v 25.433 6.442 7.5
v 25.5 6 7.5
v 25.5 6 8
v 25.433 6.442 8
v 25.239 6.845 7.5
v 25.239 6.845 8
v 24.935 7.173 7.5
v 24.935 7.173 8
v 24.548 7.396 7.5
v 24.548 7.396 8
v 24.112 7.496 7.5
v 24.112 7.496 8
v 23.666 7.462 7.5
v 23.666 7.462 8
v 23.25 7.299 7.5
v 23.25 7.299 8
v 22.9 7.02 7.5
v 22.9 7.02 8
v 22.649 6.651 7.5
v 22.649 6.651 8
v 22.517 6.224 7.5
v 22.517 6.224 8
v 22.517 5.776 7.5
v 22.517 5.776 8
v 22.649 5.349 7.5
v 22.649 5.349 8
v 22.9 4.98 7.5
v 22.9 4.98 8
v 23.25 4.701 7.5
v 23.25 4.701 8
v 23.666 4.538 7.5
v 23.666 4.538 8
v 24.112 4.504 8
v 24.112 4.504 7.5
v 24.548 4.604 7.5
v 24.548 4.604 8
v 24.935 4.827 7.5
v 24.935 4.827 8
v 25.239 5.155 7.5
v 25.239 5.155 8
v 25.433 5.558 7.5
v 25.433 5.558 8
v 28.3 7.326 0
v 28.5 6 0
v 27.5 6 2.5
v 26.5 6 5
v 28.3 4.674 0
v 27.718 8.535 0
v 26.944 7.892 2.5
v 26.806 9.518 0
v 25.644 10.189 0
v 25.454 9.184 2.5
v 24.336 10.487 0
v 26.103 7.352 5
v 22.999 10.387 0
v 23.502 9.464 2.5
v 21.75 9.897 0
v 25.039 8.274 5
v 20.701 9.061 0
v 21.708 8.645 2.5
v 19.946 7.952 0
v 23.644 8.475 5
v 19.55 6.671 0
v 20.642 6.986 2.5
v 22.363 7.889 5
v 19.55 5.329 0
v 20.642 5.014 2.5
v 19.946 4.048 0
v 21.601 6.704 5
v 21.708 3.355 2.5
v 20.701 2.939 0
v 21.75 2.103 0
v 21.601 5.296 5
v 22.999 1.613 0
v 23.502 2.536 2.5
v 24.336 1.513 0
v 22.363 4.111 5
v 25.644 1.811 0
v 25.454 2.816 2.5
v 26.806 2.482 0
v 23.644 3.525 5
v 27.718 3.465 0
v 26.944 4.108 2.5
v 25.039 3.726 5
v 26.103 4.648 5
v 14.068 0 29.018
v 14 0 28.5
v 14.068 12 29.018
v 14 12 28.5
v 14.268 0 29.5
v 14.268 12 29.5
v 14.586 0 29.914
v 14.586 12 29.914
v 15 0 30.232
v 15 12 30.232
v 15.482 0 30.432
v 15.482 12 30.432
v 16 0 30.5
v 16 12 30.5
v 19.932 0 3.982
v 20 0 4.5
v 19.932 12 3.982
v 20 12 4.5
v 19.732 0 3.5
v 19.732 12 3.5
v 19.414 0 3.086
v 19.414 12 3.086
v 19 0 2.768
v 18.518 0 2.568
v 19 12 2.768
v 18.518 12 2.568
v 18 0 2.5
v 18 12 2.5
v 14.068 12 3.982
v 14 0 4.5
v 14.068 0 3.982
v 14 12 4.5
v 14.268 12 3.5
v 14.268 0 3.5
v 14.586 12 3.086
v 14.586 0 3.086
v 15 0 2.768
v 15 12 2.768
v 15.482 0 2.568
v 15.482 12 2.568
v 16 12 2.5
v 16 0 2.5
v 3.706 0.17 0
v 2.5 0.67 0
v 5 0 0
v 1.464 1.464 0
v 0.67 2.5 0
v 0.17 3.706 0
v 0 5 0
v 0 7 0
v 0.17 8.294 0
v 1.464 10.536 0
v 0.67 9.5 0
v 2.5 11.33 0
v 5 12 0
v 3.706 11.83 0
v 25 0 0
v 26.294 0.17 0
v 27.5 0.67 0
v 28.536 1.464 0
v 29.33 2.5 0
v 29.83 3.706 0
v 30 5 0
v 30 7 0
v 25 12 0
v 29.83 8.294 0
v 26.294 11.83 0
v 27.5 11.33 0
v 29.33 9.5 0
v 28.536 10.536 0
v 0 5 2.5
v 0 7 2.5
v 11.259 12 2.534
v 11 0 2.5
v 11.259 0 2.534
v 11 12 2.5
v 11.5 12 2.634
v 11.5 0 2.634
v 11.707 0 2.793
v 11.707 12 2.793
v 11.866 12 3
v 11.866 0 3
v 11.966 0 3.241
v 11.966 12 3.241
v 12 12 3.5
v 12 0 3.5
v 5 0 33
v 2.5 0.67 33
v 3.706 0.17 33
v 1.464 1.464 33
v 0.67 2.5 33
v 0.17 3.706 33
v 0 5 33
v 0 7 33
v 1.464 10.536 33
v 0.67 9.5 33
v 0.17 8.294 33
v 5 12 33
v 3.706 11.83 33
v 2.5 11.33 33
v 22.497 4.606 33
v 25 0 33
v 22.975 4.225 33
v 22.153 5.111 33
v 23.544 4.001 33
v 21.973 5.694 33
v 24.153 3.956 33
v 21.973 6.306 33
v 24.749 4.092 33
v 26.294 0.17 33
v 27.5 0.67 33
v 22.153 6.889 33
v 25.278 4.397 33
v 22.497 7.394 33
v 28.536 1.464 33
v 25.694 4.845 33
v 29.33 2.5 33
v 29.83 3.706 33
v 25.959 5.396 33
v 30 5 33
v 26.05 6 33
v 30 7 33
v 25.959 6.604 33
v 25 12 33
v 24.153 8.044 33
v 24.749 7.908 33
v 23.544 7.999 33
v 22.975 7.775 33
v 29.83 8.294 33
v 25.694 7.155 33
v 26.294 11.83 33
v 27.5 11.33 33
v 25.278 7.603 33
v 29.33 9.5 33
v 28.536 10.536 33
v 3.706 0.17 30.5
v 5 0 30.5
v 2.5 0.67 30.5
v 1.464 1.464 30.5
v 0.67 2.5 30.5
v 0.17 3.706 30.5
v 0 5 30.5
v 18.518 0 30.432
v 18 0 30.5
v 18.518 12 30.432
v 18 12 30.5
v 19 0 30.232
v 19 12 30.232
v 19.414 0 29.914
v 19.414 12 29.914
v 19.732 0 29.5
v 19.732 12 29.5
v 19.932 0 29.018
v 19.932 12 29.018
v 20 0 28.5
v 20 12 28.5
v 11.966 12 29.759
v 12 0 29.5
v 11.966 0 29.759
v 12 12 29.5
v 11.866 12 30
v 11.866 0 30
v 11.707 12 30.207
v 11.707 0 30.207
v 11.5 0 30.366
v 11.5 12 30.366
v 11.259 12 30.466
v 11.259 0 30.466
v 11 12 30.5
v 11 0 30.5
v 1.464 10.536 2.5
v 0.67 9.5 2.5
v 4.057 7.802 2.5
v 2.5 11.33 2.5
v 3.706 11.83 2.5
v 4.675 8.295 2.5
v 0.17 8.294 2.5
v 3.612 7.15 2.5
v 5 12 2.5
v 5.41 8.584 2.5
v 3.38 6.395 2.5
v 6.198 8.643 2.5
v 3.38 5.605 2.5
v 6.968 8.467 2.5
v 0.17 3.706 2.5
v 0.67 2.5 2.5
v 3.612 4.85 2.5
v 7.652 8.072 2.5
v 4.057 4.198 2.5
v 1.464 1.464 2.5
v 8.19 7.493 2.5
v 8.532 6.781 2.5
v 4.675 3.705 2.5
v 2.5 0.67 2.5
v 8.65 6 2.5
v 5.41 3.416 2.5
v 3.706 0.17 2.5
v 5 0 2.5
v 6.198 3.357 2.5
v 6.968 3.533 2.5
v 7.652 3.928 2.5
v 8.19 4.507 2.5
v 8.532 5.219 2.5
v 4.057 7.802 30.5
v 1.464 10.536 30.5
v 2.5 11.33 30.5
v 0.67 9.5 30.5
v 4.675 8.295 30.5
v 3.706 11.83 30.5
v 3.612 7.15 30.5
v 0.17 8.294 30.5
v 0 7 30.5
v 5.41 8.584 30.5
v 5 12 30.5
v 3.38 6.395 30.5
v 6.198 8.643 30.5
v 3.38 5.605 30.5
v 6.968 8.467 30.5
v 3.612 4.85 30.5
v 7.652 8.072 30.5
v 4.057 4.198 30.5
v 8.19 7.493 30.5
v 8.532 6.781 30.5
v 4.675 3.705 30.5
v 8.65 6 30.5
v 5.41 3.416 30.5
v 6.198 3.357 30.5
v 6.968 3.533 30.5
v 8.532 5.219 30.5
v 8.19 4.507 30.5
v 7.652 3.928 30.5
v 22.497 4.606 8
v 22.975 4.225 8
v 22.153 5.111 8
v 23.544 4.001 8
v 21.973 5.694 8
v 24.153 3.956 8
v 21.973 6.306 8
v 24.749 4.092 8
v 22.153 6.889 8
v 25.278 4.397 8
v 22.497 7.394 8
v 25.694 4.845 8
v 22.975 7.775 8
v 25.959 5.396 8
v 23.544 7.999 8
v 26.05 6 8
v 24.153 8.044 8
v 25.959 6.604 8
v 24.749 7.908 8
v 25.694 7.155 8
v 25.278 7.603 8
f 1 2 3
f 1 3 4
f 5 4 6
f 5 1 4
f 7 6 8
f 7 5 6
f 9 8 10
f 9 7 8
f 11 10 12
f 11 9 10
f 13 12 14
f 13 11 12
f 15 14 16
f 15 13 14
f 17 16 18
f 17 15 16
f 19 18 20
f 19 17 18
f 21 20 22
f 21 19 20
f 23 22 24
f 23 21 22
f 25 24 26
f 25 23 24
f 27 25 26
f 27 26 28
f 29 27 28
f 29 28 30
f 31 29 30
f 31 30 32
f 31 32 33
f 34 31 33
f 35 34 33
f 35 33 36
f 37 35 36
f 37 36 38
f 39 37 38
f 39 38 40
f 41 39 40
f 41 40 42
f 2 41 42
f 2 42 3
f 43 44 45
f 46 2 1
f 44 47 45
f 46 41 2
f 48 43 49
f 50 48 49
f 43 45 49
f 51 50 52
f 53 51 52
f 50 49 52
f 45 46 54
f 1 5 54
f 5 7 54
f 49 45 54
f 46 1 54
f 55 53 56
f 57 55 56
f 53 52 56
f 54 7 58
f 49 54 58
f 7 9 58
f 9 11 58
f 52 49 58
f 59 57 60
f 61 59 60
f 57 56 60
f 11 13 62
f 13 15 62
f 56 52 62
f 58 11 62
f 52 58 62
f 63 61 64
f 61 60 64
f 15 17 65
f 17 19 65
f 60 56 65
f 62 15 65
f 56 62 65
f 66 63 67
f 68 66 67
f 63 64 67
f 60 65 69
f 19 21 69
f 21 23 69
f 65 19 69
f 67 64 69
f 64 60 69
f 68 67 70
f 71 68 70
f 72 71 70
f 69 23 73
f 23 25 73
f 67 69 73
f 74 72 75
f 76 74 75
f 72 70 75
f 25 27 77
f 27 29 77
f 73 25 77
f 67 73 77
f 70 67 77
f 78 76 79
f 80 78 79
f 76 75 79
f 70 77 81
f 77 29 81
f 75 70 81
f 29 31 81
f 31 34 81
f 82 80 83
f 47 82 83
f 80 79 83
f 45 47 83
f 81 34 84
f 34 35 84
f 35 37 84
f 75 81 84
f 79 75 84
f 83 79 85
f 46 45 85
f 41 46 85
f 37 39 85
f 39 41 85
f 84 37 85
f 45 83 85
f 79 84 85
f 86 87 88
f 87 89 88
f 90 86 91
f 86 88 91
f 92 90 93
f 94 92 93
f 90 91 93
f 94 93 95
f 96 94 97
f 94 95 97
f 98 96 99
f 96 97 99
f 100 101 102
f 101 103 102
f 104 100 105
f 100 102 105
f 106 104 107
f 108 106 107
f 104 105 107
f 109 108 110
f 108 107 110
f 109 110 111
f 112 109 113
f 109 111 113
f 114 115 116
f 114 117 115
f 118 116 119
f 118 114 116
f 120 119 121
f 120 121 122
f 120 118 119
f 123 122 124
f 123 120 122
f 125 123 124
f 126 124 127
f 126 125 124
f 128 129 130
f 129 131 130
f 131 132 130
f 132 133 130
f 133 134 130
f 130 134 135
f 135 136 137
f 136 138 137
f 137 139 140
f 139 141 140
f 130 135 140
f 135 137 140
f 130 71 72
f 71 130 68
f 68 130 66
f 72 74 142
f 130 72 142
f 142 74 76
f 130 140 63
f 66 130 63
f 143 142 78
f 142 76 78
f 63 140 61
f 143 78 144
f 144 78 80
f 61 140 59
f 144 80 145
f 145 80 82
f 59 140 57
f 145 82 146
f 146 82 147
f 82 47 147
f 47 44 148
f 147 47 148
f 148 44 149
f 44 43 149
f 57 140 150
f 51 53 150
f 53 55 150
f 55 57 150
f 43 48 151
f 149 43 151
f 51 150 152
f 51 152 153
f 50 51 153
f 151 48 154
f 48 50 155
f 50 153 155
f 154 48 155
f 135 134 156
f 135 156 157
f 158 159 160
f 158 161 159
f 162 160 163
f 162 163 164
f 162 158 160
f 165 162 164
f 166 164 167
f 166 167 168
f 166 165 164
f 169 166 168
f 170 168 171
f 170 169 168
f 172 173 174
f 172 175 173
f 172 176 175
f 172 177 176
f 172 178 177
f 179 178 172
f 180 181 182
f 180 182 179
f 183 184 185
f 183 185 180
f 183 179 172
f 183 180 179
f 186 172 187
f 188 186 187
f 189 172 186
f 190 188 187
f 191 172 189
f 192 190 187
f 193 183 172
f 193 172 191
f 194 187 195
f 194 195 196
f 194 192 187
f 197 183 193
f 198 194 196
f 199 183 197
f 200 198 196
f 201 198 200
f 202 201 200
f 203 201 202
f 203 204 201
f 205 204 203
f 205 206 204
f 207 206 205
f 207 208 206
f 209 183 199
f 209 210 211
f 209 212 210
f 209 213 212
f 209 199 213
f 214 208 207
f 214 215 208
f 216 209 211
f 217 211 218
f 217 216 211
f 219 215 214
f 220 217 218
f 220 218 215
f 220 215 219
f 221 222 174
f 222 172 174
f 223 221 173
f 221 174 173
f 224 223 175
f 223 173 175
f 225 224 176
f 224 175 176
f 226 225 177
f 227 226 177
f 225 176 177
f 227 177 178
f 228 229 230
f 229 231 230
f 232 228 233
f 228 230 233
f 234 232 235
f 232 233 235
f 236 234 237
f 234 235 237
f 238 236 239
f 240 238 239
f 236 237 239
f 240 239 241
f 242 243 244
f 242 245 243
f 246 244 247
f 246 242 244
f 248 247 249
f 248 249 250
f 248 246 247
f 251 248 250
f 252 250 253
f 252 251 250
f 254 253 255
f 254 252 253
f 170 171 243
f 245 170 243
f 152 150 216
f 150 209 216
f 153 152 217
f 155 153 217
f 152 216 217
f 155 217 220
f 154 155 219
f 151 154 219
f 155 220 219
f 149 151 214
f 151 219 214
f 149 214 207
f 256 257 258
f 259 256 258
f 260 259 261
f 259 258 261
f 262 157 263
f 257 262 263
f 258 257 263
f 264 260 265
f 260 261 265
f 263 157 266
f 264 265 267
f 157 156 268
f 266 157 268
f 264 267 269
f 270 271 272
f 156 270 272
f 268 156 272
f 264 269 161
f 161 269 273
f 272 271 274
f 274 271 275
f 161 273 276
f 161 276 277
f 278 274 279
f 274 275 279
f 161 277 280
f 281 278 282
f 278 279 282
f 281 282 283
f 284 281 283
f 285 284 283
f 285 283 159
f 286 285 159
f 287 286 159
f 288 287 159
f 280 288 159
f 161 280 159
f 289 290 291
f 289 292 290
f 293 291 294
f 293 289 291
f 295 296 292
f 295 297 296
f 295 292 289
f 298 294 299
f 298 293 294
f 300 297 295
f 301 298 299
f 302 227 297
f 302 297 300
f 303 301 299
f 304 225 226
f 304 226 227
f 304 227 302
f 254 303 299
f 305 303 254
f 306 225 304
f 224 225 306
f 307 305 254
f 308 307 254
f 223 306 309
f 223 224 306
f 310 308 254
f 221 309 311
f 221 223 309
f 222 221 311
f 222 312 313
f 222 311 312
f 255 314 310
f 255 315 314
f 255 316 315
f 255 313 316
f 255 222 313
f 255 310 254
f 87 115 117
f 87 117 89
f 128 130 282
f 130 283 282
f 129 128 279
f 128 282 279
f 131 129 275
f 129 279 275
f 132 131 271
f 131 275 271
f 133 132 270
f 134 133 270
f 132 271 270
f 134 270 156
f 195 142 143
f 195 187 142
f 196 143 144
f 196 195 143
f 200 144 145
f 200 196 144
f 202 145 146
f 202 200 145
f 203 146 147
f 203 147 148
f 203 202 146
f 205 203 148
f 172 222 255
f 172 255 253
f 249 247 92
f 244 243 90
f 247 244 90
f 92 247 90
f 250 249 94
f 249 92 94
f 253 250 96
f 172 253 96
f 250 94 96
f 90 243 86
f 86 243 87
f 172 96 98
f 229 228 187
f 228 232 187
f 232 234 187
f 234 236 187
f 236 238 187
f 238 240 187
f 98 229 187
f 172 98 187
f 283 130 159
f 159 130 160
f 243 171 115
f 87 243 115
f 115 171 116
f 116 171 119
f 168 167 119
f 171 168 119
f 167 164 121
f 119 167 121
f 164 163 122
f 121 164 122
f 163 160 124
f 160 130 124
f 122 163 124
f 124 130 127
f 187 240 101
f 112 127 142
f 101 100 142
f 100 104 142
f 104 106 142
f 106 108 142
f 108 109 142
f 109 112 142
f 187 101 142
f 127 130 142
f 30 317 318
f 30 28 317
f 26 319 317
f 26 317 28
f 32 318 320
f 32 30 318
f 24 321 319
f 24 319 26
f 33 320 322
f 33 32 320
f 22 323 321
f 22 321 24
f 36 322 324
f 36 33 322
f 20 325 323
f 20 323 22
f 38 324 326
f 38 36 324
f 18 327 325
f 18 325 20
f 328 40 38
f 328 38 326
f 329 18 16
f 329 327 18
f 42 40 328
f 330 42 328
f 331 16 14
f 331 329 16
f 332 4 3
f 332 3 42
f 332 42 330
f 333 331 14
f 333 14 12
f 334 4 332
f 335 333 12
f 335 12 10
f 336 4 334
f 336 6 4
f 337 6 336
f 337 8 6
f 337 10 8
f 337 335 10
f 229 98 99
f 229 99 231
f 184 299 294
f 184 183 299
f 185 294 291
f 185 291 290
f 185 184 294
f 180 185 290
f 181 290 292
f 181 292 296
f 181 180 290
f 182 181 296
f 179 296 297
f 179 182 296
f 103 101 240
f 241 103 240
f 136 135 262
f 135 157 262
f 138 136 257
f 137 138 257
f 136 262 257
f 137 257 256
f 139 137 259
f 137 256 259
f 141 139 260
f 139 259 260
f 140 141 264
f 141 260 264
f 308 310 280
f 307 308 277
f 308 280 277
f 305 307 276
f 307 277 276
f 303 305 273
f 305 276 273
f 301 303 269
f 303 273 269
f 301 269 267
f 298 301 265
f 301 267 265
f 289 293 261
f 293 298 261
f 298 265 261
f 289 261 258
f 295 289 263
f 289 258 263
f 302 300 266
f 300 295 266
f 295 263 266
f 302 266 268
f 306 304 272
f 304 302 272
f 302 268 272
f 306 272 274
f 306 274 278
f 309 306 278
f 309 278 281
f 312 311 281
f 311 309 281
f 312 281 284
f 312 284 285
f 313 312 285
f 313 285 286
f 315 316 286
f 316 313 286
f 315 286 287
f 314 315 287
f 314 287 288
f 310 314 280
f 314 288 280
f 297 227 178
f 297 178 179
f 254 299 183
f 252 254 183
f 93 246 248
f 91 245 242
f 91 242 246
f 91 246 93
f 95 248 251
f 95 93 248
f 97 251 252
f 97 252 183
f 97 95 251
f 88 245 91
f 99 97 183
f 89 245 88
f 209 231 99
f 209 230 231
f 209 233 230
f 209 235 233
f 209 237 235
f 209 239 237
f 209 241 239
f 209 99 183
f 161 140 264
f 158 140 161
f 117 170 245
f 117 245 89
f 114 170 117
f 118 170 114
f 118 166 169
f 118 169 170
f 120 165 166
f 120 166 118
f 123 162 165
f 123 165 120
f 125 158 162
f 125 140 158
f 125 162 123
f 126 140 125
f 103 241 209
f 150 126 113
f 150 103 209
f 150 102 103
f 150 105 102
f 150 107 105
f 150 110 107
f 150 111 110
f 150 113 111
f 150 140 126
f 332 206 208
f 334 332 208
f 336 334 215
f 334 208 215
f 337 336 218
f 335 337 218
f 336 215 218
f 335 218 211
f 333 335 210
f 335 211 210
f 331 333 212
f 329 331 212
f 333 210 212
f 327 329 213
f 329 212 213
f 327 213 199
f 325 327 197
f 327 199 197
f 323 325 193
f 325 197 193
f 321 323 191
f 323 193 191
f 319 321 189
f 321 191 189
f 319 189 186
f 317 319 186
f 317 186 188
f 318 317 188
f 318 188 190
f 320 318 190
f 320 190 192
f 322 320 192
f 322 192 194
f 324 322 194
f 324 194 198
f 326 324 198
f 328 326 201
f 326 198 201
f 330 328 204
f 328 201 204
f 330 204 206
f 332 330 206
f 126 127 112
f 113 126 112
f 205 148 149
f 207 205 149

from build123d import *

# Parameters (mm, degrees)
F0_W      = 30
F0_H      = 12
F0_R      = 1.5
F1_DEPTH  = 33
F2_W      = 12
F2_H      = 28
F3_DEPTH  = 25
F4_R      = 2.65
F5_DEPTH  = 28.5
F6_R      = 5
F7_R      = 1
F8_R      = 2.05
F8_R_2    = 1.5
F9_DEPTH  = 25
F10_SIZE2 = 7.5
F10_SIZE  = 3
F11_W     = 6
F11_H     = 28
F12_DEPTH = 25
F13_R     = 2


with BuildPart() as f1:
    # F0 (on Top) → F1 (new body)
    with BuildSketch(Plane.XY):
        with Locations((15, 6)):
            Rectangle(F0_W, F0_H)
        with Locations((24, 6)):
            Circle(F0_R, mode=Mode.SUBTRACT)
    extrude(amount=F1_DEPTH)

    # F2 (on face) → F3 (cut)
    with BuildSketch(Plane.XZ):
        with Locations((6, 16.5)):
            Rectangle(F2_W, F2_H)
    extrude(amount=-F3_DEPTH, mode=Mode.SUBTRACT)

    # F4 (on face) → F5 (join)
    with BuildSketch(Plane.XY.offset(2.5)):
        with Locations((6, 6)):
            Circle(F4_R)
    extrude(amount=F5_DEPTH)

    # F6
    f6_edges = [f1.edges().sort_by_distance(p)[0] for p in [
        (0, 0, 1.25),
        (0, 0, 31.75),
        (0, 12, 1.25),
        (0, 12, 31.75),
        (30, 0, 16.5),
        (30, 12, 16.5),
    ]]
    fillet(f6_edges, radius=F6_R)

    # F7
    f7_edges = [f1.edges().sort_by_distance(p)[0] for p in [
        (12, 6, 2.5),
        (12, 6, 30.5),
    ]]
    fillet(f7_edges, radius=F7_R)

    # F8 (on face) → F9 (cut)
    with BuildSketch(Plane.XY.offset(33)):
        with Locations((24, 6)):
            Circle(F8_R)
        with Locations((24, 6)):
            Circle(F8_R_2, mode=Mode.SUBTRACT)
    extrude(amount=-F9_DEPTH, mode=Mode.SUBTRACT)

    # F10
    f10_edges = [f1.edges().sort_by_distance(p)[0] for p in [
        (22.5, 6, 0),
    ]]
    chamfer(f10_edges, length=F10_SIZE, length2=F10_SIZE2)

    # F11 (on face) → F12 (cut)
    with BuildSketch(Plane.XZ):
        with Locations((17, 16.5)):
            Rectangle(F11_W, F11_H)
    extrude(amount=-F12_DEPTH, mode=Mode.SUBTRACT)

    # F13
    f13_edges = [f1.edges().sort_by_distance(p)[0] for p in [
        (14, 6, 30.5),
        (20, 6, 30.5),
        (14, 6, 2.5),
        (20, 6, 2.5),
    ]]
    fillet(f13_edges, radius=F13_R)


solid = f1.part
